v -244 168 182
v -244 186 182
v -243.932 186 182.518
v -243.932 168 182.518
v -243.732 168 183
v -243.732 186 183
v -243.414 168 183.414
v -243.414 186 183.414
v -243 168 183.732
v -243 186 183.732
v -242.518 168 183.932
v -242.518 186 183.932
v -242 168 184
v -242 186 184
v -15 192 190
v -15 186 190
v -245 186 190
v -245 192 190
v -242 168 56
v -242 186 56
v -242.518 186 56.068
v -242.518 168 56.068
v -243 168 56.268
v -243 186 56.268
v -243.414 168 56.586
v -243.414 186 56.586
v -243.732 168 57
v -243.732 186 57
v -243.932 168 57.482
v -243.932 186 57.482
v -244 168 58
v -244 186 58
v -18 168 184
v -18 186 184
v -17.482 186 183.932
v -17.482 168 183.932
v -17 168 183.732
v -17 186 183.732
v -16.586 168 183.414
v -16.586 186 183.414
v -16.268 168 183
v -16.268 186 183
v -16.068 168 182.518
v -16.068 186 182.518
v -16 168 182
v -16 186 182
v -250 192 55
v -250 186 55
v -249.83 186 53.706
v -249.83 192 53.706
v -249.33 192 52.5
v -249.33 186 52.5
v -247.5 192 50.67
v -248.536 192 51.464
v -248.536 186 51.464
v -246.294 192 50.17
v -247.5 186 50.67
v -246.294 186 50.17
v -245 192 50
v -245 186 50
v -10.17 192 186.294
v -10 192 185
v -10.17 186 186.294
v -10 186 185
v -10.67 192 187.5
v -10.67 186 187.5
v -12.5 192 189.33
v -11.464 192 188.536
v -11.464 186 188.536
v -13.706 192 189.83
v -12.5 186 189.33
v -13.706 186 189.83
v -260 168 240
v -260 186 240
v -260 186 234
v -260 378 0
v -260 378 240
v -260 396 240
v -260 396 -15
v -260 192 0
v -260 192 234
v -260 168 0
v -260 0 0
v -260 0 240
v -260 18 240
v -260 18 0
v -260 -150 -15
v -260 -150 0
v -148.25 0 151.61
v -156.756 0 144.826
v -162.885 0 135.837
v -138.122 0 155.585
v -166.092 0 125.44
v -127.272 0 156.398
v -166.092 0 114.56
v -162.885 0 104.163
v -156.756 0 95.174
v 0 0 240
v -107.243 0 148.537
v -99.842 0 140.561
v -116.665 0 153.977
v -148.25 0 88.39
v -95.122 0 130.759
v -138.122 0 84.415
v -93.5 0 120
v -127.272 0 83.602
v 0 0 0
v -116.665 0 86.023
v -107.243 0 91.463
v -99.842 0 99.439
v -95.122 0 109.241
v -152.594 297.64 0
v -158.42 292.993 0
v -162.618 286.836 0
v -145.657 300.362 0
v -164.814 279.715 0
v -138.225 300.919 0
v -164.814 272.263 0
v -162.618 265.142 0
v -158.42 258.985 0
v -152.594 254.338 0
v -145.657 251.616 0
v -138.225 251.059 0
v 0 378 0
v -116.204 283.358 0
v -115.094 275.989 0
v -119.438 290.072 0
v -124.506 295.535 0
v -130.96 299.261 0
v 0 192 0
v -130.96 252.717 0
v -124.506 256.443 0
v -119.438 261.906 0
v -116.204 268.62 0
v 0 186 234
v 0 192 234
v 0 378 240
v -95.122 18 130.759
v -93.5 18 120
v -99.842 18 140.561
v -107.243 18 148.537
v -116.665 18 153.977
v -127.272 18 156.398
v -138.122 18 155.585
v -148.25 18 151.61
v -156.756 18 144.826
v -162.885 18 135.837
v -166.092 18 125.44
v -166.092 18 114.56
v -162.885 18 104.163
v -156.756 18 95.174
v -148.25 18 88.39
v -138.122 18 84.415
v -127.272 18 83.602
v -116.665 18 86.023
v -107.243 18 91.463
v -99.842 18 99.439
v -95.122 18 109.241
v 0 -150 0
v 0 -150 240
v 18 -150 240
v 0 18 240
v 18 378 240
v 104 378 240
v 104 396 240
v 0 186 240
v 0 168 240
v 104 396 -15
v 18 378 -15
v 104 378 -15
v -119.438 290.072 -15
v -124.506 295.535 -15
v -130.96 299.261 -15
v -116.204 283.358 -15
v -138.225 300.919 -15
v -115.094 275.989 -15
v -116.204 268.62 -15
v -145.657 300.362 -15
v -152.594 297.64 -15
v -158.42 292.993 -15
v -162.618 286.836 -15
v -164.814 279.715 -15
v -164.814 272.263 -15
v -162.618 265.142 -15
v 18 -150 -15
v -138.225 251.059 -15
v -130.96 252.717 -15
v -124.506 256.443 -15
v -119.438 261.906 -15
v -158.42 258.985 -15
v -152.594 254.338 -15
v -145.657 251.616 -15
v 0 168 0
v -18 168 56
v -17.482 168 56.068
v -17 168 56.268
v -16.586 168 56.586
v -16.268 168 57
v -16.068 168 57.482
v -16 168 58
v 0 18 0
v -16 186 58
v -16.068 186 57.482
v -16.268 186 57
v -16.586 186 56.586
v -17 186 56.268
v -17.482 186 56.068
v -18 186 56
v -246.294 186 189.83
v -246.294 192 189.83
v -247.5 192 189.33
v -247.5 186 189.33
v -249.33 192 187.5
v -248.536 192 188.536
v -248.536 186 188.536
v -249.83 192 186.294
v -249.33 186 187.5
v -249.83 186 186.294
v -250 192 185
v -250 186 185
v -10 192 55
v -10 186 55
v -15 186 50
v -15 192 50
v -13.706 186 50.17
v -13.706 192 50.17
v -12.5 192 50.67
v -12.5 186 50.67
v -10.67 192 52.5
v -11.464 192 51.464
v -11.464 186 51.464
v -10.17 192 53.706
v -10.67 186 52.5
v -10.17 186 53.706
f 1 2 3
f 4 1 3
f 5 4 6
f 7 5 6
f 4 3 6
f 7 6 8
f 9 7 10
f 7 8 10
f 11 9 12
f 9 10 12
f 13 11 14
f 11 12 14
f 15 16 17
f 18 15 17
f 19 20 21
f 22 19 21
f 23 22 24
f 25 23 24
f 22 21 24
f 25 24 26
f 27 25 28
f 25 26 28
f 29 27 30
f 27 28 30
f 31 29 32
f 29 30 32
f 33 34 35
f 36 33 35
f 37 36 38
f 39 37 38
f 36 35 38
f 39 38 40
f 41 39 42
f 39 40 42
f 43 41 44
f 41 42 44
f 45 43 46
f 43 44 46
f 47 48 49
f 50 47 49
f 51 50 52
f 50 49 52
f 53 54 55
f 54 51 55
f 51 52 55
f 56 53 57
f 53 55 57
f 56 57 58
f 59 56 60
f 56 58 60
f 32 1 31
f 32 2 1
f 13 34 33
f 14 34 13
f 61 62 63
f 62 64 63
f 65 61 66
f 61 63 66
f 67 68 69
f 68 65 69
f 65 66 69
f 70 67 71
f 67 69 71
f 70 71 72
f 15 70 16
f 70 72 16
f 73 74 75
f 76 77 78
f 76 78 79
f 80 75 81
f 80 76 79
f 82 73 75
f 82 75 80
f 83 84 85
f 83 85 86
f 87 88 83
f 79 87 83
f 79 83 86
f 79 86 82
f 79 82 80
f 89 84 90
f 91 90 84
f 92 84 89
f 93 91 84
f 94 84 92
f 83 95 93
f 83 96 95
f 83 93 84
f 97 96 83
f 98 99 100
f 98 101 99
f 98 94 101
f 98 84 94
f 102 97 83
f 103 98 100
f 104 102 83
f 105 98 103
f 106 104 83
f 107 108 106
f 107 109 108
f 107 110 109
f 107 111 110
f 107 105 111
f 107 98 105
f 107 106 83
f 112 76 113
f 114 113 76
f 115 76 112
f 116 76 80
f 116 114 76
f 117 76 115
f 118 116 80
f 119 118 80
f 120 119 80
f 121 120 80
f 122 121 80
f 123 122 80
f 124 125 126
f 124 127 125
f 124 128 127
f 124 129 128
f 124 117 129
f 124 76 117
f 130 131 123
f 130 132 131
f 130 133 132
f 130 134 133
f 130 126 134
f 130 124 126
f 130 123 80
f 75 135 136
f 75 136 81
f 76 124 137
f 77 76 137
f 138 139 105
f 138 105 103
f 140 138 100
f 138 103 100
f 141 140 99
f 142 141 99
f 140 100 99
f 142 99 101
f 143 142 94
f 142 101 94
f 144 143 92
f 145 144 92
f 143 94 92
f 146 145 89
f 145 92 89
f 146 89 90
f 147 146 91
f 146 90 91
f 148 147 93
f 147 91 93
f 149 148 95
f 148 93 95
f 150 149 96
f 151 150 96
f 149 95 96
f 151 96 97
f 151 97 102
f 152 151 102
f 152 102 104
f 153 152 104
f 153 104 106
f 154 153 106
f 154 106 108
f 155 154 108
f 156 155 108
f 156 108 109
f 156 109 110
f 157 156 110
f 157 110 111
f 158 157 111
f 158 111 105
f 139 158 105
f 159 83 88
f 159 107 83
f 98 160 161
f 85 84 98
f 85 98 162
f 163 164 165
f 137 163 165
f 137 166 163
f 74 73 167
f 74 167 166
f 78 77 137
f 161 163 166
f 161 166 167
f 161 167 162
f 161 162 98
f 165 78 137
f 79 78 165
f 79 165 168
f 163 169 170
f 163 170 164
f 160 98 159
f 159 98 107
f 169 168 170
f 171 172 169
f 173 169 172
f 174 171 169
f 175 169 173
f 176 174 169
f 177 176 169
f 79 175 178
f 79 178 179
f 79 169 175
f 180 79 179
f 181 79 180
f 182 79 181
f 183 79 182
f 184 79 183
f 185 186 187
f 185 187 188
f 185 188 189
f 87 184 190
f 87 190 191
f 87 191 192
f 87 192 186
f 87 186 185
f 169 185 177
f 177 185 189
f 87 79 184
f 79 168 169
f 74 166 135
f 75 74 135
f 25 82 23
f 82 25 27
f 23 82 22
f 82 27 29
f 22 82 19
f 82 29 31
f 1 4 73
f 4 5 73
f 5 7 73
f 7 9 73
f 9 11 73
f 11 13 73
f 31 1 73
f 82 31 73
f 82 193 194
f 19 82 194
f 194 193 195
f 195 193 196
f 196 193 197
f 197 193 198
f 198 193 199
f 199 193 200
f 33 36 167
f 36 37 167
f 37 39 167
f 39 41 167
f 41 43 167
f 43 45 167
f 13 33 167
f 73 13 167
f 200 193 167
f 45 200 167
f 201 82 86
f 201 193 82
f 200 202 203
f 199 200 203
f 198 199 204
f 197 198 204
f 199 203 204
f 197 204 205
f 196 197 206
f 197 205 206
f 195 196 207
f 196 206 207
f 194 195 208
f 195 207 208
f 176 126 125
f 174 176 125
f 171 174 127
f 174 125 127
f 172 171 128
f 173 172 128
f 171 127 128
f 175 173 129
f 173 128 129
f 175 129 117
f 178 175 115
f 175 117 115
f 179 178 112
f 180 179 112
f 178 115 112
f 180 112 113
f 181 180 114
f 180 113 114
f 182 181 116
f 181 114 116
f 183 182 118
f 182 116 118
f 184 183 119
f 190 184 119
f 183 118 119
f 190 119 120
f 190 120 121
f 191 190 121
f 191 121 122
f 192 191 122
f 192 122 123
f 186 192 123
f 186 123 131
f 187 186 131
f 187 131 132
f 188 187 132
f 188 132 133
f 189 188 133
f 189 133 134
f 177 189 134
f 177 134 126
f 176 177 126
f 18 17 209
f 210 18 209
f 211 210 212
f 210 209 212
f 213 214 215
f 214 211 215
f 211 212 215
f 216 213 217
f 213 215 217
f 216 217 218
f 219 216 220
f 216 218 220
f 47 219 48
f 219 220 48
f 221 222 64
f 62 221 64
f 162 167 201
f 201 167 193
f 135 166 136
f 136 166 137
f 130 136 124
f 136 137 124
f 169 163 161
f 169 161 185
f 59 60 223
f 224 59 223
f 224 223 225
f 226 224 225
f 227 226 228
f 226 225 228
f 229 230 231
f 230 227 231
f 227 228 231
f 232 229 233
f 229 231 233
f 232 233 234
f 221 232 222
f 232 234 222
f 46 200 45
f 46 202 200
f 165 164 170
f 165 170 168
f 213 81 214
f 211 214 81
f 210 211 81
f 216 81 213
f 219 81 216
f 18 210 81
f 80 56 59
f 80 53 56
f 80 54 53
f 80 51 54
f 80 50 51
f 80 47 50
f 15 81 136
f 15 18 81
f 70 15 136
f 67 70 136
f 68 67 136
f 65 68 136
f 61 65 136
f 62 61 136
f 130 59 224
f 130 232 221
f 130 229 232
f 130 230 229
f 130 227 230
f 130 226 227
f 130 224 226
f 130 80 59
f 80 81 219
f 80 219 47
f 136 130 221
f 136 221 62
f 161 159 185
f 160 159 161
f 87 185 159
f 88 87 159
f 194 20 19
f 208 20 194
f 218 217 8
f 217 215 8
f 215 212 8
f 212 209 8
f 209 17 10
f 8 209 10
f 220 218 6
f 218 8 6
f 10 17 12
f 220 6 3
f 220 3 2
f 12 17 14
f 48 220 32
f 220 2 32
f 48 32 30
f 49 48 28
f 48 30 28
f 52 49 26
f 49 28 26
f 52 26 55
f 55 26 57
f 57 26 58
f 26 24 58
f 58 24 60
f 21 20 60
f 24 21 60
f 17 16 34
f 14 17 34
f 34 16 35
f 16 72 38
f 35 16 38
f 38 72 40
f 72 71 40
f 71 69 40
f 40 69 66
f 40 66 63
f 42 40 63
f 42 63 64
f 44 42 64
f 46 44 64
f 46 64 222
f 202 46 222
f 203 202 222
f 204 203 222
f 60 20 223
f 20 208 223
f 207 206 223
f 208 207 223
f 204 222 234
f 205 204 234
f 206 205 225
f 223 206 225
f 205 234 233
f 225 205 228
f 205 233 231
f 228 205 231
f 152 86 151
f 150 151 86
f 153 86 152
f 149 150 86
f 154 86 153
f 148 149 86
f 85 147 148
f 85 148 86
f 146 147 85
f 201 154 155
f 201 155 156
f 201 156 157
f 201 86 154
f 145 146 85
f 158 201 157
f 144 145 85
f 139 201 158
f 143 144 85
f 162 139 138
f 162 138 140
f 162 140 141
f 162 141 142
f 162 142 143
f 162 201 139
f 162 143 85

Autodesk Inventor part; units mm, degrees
ref_plane "YZ Plane" through (0, 0, 0) normal (1, 0, 0) x (0, 1, 0)
ref_plane "XZ Plane" through (0, 0, 0) normal (0, 1, 0) x (-1, 0, 0)
ref_plane "XY Plane" through (0, 0, 0) normal (0, 0, 1) x (1, 0, 0)
sketch "Skizze1" plane through (0, 0, 0) normal (1, 0, 0) x (0, 1, 0)
  line L0 (0, 0) -> (18, 0)
  line L1 (18, 0) -> (18, 240)
  line L2 (18, 240) -> (0, 240)
  line L3 (0, 240) -> (0, 0)
  line L4 (378, 0) -> (-150, 0)
  line L5 (-150, -15) -> (378, -15)
  line L6 (378, -15) -> (378, 0)
  line L7 (378, -15) -> (378, 240)
  line L8 (378, 240) -> (396, 240)
  line L9 (396, 240) -> (396, -15)
  line L10 (396, -15) -> (378, -15)
  line L11 (-150, 0) -> (-150, -15)
  line L12 (186, 0) -> (168, 0)
  line L13 (168, 0) -> (168, 240)
  line L14 (168, 240) -> (186, 240)
  line L15 (186, 240) -> (186, 0)
  dimension "d0" = 18
  dimension "d1" = 15
  dimension "d2" = 18
  dimension "d5" = 255
  dimension "d6" = 360
  dimension "d23" = 150
  dimension "d49" = 18
  dimension "d50" = 150
  dimension "d51" = 192
  dimension "d52" = 255
extrude "Extrusion1" add sketch "Skizze1" against normal blind 260
extrude "Extrusion7" add sketch "Skizze1" along normal blind 104 contours L6 L7 L8 L9 L10
sketch "Skizze2" plane through (0, 0, 0) normal (0, -1, 0) x (1, 0, 0)
  line L0 (0, 0) -> (-260, 0) projected
  line L1 (0, 240) -> (-260, 240) projected
  circle A0 centre (-130, 120) radius 36.5
  line L2 (-130, 240) -> (-130, 0) construction
  point P0 (240, 0)
  dimension "d9" = 73
extrude "Extrusion2" cut sketch "Skizze2" against normal up to surface (18 mm away)
sketch "Skizze4" plane through (0, 18, 0) normal (0, 0, 1) x (1, 0, 0)
  circle A0 centre (-140.0937, 257.9889) radius 25
  ellipse E0 centre (-140.0937, 257.9889) end of major axis (-140.0937, 283.4889) minor radius 25.5 projected
  dimension "d16" = 50
extrude "Extrusion4" cut sketch "Skizze4" against normal up to surface (15 mm away) contours A0
sketch "Skizze6" plane through (0, 0, 0) normal (1, 0, 0) x (0, 0, -1)
  line L0 (15, -150) -> (15, 378) projected
  line L1 (-240, 378) -> (15, 378)
  line L2 (15, 378) -> (15, -150)
  line L3 (15, -150) -> (-240, -150)
  line L4 (-240, -150) -> (-240, 378)
  line L5 (15, 396) -> (15, 378) projected
  line L6 (15, 378) -> (15, -150) projected
  line L7 (15, -150) -> (0, -150) projected
  line L8 (0, 0) -> (-240, 0) projected
  line L9 (-240, 0) -> (-240, 18) projected
  line L10 (-240, 18) -> (0, 18) projected
  line L11 (0, 186) -> (0, 378) projected
  line L12 (0, 378) -> (-240, 378) projected
  line L13 (-240, 378) -> (-240, 396) projected
  line L14 (-240, 396) -> (15, 396) projected
  line L15 (15, 378) -> (0, 378) projected
  line L16 (-240, 168) -> (-240, 186) projected
  line L17 (-240, 186) -> (0, 186) projected
  line L18 (0, 18) -> (0, 168) projected
  line L19 (0, 168) -> (-240, 168) projected
  line L20 (0, -150) -> (0, 0) projected
extrude "Extrusion8" add sketch "Skizze6" along normal blind 18
sketch "Skizze9" plane through (-260, 186, 240) normal (0, 1, 0) x (1, 0, 0)
  line L0 (260, 240) -> (0, 240) projected
  line L1 (260, 0) -> (0, 0) projected
  line L2 (250, 185) -> (250, 55)
  line L3 (245, 50) -> (15, 50)
  line L4 (10, 55) -> (10, 185)
  line L5 (15, 190) -> (245, 190)
  line L6 (250, 190) -> (10, 50) construction
  line L7 (250, 50) -> (10, 190) construction
  arc A0 (250, 185) -> (245, 190) centre (245, 185) ccw
  arc A1 (15, 190) -> (10, 185) centre (15, 185) ccw
  arc A2 (10, 55) -> (15, 50) centre (15, 55) ccw
  arc A3 (245, 50) -> (250, 55) centre (245, 55) ccw
  line L8 (14, 184) -> (14, 56)
  line L9 (16, 54) -> (244, 54)
  line L10 (246, 56) -> (246, 184)
  line L11 (244, 186) -> (16, 186)
  line L12 (14, 186) -> (246, 54) construction
  line L13 (14, 54) -> (246, 186) construction
  arc A4 (244, 54) -> (246, 56) centre (244, 56) ccw
  arc A5 (14, 56) -> (16, 54) centre (16, 56) ccw
  arc A6 (16, 186) -> (14, 184) centre (16, 184) ccw
  arc A7 (246, 184) -> (244, 186) centre (244, 184) ccw
  line L14 (244, 182) -> (244, 58)
  line L15 (242, 56) -> (18, 56)
  line L16 (16, 58) -> (16, 182)
  line L17 (18, 184) -> (242, 184)
  line L18 (244, 184) -> (16, 56) construction
  line L19 (244, 56) -> (16, 184) construction
  arc A8 (242, 56) -> (244, 58) centre (242, 58) ccw
  arc A9 (16, 58) -> (18, 56) centre (18, 58) ccw
  arc A10 (18, 184) -> (16, 182) centre (18, 182) ccw
  arc A11 (244, 182) -> (242, 184) centre (242, 182) ccw
  line L20 (130, 0) -> (130, 240) construction
  line L21 (0, 240) -> (260, 240)
  line L22 (260, 240) -> (260, 0)
  line L23 (260, 0) -> (0, 0)
  line L24 (0, 0) -> (0, 240)
  line L25 (260, 240) -> (260, 0) projected
  line L26 (0, 0) -> (260, 0)
  line L27 (260, 0) -> (260, 6)
  line L28 (260, 6) -> (0, 6)
  line L29 (0, 6) -> (0, 0)
  point P0 (130, 120)
  dimension "d53" = 140
  dimension "d54" = 240
  dimension "d55" = 5
  dimension "d56" = 232
  dimension "d57" = 132
  dimension "d58" = 2
  dimension "d59" = 128
  dimension "d60" = 228
  dimension "d61" = 2
  dimension "d67" = 6
extrude "Extrusion11" cut sketch "Skizze9" against normal up to surface (18 mm away) contours L14 A8 L15 A9 L16 A10 L17 A11
extrude "Extrusion12" add sketch "Skizze9" along normal blind 6 contours L22 L28 L24 L0
equation "\"d0\" = case_thickness"
equation "\"d1\" = inner_thickness"
equation "\"d2\" = case_thickness"
equation "\"d5\" = inner_depth"
equation "\"d49\" = case_thickness"
equation "\"d52\" = inner_depth"
equation "\"d7\" = inner_width"
equation "\"d26\" = -2 * case_thickness + case_width - inner_width"
equation "\"d10\" = case_width - 2 * case_thickness"
equation "\"d16\" = ht_diameter"
equation "\"d17\" = case_width - 2 * case_thickness"
equation "\"d28\" = case_thickness"
equation "\"d67\" = mdf_thickness"
equation "\"d65\" = mdf_thickness"
equation "\"kg_thickness\" = 4.9"
equation "\"ht_diameter\" = 50"
equation "\"ht_thickness\" = 1.9"
equation "\"case_thickness\" = 18"
equation "\"inner_thickness\" = 15"
equation "\"gap_fit\" = 0.1"
equation "\"gap_slide\" = 0.2"
equation "\"gap_air\" = 1"
equation "\"bore_diameter\" = 73"
equation "\"mdf_thickness\" = 6"
equation "\"tape_width\" = 15"
equation "\"tape_thickness\" = 3"
equation "\"inner_depth\" = 255"
equation "\"inner_width\" = 260"
equation "\"case_width\" = 400"
properties part number "Korpus_Einbau"
